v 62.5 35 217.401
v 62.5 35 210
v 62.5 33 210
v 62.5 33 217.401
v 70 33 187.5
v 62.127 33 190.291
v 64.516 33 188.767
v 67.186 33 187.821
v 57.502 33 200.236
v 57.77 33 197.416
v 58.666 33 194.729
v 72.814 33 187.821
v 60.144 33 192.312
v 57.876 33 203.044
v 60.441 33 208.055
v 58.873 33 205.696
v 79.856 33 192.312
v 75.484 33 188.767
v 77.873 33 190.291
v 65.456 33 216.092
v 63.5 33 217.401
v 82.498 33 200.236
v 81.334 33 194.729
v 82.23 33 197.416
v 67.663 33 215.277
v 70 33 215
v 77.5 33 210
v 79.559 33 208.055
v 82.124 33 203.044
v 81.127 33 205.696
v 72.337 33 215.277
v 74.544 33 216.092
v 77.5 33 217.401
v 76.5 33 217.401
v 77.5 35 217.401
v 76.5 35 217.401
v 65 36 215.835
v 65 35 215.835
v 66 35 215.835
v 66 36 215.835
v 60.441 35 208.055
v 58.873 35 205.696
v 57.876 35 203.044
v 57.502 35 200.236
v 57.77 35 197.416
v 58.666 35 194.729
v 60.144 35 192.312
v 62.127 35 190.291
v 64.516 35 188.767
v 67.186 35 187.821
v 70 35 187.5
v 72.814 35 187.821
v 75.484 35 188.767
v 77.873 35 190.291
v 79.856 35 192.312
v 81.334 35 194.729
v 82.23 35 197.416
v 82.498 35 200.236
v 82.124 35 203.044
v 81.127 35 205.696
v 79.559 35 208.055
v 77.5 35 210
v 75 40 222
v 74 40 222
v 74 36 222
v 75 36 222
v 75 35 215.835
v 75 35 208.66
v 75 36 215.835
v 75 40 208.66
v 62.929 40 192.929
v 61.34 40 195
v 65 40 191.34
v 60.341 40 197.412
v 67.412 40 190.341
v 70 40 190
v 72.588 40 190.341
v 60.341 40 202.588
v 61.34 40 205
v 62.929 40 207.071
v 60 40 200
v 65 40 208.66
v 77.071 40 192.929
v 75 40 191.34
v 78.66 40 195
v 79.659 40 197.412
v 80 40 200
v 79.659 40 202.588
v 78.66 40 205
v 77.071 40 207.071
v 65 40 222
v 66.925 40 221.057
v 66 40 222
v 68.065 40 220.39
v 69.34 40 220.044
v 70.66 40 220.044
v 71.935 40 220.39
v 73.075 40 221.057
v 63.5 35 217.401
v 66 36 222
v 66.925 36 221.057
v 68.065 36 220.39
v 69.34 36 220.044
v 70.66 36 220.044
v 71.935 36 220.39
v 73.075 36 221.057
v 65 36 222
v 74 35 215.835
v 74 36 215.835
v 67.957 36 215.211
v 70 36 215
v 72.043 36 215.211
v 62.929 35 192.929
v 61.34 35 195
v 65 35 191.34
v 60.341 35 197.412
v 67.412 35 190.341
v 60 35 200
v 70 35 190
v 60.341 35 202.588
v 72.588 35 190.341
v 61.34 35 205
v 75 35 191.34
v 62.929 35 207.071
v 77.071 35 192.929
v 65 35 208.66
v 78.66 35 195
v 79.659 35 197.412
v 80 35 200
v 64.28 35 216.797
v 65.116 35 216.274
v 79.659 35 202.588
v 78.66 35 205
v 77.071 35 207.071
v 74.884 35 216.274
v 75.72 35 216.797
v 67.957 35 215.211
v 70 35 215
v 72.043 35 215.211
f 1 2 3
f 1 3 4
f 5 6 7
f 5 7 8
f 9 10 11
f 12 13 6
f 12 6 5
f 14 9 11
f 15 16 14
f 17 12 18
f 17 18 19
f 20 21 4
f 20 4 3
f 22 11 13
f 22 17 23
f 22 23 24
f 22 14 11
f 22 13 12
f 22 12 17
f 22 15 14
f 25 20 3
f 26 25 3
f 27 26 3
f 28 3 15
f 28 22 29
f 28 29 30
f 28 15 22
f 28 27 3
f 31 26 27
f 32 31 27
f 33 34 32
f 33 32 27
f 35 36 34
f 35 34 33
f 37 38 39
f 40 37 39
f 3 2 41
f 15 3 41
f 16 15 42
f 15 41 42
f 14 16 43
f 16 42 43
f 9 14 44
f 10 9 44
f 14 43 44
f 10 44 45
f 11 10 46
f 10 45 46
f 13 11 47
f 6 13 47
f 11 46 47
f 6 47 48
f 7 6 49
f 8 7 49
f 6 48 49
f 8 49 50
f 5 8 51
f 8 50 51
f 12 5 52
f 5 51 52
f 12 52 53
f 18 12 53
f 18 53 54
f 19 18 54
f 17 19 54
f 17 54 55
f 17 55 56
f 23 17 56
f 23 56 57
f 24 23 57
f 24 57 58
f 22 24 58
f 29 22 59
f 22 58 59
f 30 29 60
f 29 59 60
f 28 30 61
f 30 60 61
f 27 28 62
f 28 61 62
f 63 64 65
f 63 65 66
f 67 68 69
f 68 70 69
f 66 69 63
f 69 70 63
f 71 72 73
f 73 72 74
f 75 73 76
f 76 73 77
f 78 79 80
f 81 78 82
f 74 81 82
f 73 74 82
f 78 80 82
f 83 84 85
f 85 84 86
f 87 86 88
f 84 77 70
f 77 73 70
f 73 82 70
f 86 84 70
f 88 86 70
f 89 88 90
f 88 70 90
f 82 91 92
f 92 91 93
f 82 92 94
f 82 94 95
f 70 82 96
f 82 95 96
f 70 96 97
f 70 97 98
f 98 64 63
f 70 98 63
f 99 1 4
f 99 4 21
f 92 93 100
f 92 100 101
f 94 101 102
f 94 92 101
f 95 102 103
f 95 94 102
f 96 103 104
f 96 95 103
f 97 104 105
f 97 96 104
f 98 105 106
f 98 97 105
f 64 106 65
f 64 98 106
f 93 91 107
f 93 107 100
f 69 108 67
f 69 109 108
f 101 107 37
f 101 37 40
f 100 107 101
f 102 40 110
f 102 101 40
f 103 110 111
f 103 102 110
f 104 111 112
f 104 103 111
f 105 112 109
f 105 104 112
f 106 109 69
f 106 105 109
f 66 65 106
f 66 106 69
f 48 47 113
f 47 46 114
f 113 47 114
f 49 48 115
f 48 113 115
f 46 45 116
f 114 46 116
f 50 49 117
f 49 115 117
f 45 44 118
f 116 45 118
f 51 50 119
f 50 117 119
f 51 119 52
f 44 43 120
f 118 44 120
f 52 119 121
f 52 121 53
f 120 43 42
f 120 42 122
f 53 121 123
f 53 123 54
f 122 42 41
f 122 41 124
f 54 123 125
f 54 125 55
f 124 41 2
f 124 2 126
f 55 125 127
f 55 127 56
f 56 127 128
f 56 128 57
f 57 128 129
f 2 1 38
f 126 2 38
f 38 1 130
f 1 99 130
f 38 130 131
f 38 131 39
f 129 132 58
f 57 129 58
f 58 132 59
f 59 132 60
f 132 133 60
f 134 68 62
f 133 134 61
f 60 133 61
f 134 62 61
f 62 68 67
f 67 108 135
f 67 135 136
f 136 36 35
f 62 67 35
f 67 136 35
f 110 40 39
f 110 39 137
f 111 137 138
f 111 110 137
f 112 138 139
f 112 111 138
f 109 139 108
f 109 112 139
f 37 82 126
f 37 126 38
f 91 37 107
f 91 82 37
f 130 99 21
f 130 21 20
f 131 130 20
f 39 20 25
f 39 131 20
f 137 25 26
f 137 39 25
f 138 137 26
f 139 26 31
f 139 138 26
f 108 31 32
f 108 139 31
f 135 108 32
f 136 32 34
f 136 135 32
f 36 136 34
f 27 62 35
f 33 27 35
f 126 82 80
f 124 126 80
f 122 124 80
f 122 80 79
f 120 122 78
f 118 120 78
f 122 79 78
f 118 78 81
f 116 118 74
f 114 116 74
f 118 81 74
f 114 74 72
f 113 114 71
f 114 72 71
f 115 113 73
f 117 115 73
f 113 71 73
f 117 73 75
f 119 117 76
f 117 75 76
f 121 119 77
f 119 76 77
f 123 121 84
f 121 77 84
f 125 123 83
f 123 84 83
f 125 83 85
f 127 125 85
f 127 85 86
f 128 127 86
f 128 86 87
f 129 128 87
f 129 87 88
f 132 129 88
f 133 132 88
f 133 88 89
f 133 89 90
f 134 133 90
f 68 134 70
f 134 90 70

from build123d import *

# Parameters (mm, degrees)
EXTRUDE028_DEPTH = 2
EXTRUDE029_DEPTH = 1
EXTRUDE027_DEPTH = 4


with BuildPart() as hangerlockfront:
    # Sketch037 → Extrude028 (new body)
    with BuildSketch(Plane.XZ):
        with BuildLine():
            ThreePointArc((-7.5, 10), (0, -12.5), (7.5, 10))
            Line((7.5, 10), (7.5, 17.400658))
            Line((6.5, 17.400658), (7.5, 17.400658))
            ThreePointArc((-6.5, 17.400658), (0, 15), (6.5, 17.400658))
            Line((-7.5, 17.400658), (-6.5, 17.400658))
            Line((-7.5, 10), (-7.5, 17.400658))
        make_face()
    extrude(amount=EXTRUDE028_DEPTH)


with BuildPart() as hangerlockfront_1:
    # Extrude028 placement: moved
    add(hangerlockfront.part.moved(Location((0, -5, 0))))


with BuildPart() as hangerlockspacer:
    # Sketch038 → Extrude029 (new body)
    with BuildSketch(Plane.XZ):
        with BuildLine():
            ThreePointArc((-5, 8.660254), (0, -10), (5, 8.660254))
            Line((5, 8.660254), (5, 15.834849))
            Line((4, 15.834849), (5, 15.834849))
            ThreePointArc((-4, 15.834849), (0, 15), (4, 15.834849))
            Line((-5, 15.834849), (-4, 15.834849))
            Line((-5, 8.660254), (-5, 15.834849))
        make_face()
    extrude(amount=EXTRUDE029_DEPTH)


with BuildPart() as hangerlockspacer_1:
    # Extrude029 placement: moved
    add(hangerlockspacer.part.moved(Location((0, -4, 0))))


with BuildPart() as hangerlockright:
    # Sketch036 → Extrude027 (new body)
    with BuildSketch(Plane.XZ):
        with BuildLine():
            ThreePointArc((-5, 8.660254), (0, -10), (5, 8.660254))
            Line((5, 8.660254), (5, 22))
            Line((4, 22), (5, 22))
            ThreePointArc((-4, 22), (0, 20), (4, 22))
            Line((-5, 22), (-4, 22))
            Line((-5, 8.660254), (-5, 22))
        make_face()
    extrude(amount=EXTRUDE027_DEPTH)

    # Fusion002: union HangerLockFront, HangerLockSpacer
    add(hangerlockfront_1.part)
    add(hangerlockspacer_1.part)


with BuildPart() as hangerlockright_1:
    # Fusion002 placement: moved
    add(hangerlockright.part.moved(Location((70, 40, 200))))


solid = hangerlockright_1.part
